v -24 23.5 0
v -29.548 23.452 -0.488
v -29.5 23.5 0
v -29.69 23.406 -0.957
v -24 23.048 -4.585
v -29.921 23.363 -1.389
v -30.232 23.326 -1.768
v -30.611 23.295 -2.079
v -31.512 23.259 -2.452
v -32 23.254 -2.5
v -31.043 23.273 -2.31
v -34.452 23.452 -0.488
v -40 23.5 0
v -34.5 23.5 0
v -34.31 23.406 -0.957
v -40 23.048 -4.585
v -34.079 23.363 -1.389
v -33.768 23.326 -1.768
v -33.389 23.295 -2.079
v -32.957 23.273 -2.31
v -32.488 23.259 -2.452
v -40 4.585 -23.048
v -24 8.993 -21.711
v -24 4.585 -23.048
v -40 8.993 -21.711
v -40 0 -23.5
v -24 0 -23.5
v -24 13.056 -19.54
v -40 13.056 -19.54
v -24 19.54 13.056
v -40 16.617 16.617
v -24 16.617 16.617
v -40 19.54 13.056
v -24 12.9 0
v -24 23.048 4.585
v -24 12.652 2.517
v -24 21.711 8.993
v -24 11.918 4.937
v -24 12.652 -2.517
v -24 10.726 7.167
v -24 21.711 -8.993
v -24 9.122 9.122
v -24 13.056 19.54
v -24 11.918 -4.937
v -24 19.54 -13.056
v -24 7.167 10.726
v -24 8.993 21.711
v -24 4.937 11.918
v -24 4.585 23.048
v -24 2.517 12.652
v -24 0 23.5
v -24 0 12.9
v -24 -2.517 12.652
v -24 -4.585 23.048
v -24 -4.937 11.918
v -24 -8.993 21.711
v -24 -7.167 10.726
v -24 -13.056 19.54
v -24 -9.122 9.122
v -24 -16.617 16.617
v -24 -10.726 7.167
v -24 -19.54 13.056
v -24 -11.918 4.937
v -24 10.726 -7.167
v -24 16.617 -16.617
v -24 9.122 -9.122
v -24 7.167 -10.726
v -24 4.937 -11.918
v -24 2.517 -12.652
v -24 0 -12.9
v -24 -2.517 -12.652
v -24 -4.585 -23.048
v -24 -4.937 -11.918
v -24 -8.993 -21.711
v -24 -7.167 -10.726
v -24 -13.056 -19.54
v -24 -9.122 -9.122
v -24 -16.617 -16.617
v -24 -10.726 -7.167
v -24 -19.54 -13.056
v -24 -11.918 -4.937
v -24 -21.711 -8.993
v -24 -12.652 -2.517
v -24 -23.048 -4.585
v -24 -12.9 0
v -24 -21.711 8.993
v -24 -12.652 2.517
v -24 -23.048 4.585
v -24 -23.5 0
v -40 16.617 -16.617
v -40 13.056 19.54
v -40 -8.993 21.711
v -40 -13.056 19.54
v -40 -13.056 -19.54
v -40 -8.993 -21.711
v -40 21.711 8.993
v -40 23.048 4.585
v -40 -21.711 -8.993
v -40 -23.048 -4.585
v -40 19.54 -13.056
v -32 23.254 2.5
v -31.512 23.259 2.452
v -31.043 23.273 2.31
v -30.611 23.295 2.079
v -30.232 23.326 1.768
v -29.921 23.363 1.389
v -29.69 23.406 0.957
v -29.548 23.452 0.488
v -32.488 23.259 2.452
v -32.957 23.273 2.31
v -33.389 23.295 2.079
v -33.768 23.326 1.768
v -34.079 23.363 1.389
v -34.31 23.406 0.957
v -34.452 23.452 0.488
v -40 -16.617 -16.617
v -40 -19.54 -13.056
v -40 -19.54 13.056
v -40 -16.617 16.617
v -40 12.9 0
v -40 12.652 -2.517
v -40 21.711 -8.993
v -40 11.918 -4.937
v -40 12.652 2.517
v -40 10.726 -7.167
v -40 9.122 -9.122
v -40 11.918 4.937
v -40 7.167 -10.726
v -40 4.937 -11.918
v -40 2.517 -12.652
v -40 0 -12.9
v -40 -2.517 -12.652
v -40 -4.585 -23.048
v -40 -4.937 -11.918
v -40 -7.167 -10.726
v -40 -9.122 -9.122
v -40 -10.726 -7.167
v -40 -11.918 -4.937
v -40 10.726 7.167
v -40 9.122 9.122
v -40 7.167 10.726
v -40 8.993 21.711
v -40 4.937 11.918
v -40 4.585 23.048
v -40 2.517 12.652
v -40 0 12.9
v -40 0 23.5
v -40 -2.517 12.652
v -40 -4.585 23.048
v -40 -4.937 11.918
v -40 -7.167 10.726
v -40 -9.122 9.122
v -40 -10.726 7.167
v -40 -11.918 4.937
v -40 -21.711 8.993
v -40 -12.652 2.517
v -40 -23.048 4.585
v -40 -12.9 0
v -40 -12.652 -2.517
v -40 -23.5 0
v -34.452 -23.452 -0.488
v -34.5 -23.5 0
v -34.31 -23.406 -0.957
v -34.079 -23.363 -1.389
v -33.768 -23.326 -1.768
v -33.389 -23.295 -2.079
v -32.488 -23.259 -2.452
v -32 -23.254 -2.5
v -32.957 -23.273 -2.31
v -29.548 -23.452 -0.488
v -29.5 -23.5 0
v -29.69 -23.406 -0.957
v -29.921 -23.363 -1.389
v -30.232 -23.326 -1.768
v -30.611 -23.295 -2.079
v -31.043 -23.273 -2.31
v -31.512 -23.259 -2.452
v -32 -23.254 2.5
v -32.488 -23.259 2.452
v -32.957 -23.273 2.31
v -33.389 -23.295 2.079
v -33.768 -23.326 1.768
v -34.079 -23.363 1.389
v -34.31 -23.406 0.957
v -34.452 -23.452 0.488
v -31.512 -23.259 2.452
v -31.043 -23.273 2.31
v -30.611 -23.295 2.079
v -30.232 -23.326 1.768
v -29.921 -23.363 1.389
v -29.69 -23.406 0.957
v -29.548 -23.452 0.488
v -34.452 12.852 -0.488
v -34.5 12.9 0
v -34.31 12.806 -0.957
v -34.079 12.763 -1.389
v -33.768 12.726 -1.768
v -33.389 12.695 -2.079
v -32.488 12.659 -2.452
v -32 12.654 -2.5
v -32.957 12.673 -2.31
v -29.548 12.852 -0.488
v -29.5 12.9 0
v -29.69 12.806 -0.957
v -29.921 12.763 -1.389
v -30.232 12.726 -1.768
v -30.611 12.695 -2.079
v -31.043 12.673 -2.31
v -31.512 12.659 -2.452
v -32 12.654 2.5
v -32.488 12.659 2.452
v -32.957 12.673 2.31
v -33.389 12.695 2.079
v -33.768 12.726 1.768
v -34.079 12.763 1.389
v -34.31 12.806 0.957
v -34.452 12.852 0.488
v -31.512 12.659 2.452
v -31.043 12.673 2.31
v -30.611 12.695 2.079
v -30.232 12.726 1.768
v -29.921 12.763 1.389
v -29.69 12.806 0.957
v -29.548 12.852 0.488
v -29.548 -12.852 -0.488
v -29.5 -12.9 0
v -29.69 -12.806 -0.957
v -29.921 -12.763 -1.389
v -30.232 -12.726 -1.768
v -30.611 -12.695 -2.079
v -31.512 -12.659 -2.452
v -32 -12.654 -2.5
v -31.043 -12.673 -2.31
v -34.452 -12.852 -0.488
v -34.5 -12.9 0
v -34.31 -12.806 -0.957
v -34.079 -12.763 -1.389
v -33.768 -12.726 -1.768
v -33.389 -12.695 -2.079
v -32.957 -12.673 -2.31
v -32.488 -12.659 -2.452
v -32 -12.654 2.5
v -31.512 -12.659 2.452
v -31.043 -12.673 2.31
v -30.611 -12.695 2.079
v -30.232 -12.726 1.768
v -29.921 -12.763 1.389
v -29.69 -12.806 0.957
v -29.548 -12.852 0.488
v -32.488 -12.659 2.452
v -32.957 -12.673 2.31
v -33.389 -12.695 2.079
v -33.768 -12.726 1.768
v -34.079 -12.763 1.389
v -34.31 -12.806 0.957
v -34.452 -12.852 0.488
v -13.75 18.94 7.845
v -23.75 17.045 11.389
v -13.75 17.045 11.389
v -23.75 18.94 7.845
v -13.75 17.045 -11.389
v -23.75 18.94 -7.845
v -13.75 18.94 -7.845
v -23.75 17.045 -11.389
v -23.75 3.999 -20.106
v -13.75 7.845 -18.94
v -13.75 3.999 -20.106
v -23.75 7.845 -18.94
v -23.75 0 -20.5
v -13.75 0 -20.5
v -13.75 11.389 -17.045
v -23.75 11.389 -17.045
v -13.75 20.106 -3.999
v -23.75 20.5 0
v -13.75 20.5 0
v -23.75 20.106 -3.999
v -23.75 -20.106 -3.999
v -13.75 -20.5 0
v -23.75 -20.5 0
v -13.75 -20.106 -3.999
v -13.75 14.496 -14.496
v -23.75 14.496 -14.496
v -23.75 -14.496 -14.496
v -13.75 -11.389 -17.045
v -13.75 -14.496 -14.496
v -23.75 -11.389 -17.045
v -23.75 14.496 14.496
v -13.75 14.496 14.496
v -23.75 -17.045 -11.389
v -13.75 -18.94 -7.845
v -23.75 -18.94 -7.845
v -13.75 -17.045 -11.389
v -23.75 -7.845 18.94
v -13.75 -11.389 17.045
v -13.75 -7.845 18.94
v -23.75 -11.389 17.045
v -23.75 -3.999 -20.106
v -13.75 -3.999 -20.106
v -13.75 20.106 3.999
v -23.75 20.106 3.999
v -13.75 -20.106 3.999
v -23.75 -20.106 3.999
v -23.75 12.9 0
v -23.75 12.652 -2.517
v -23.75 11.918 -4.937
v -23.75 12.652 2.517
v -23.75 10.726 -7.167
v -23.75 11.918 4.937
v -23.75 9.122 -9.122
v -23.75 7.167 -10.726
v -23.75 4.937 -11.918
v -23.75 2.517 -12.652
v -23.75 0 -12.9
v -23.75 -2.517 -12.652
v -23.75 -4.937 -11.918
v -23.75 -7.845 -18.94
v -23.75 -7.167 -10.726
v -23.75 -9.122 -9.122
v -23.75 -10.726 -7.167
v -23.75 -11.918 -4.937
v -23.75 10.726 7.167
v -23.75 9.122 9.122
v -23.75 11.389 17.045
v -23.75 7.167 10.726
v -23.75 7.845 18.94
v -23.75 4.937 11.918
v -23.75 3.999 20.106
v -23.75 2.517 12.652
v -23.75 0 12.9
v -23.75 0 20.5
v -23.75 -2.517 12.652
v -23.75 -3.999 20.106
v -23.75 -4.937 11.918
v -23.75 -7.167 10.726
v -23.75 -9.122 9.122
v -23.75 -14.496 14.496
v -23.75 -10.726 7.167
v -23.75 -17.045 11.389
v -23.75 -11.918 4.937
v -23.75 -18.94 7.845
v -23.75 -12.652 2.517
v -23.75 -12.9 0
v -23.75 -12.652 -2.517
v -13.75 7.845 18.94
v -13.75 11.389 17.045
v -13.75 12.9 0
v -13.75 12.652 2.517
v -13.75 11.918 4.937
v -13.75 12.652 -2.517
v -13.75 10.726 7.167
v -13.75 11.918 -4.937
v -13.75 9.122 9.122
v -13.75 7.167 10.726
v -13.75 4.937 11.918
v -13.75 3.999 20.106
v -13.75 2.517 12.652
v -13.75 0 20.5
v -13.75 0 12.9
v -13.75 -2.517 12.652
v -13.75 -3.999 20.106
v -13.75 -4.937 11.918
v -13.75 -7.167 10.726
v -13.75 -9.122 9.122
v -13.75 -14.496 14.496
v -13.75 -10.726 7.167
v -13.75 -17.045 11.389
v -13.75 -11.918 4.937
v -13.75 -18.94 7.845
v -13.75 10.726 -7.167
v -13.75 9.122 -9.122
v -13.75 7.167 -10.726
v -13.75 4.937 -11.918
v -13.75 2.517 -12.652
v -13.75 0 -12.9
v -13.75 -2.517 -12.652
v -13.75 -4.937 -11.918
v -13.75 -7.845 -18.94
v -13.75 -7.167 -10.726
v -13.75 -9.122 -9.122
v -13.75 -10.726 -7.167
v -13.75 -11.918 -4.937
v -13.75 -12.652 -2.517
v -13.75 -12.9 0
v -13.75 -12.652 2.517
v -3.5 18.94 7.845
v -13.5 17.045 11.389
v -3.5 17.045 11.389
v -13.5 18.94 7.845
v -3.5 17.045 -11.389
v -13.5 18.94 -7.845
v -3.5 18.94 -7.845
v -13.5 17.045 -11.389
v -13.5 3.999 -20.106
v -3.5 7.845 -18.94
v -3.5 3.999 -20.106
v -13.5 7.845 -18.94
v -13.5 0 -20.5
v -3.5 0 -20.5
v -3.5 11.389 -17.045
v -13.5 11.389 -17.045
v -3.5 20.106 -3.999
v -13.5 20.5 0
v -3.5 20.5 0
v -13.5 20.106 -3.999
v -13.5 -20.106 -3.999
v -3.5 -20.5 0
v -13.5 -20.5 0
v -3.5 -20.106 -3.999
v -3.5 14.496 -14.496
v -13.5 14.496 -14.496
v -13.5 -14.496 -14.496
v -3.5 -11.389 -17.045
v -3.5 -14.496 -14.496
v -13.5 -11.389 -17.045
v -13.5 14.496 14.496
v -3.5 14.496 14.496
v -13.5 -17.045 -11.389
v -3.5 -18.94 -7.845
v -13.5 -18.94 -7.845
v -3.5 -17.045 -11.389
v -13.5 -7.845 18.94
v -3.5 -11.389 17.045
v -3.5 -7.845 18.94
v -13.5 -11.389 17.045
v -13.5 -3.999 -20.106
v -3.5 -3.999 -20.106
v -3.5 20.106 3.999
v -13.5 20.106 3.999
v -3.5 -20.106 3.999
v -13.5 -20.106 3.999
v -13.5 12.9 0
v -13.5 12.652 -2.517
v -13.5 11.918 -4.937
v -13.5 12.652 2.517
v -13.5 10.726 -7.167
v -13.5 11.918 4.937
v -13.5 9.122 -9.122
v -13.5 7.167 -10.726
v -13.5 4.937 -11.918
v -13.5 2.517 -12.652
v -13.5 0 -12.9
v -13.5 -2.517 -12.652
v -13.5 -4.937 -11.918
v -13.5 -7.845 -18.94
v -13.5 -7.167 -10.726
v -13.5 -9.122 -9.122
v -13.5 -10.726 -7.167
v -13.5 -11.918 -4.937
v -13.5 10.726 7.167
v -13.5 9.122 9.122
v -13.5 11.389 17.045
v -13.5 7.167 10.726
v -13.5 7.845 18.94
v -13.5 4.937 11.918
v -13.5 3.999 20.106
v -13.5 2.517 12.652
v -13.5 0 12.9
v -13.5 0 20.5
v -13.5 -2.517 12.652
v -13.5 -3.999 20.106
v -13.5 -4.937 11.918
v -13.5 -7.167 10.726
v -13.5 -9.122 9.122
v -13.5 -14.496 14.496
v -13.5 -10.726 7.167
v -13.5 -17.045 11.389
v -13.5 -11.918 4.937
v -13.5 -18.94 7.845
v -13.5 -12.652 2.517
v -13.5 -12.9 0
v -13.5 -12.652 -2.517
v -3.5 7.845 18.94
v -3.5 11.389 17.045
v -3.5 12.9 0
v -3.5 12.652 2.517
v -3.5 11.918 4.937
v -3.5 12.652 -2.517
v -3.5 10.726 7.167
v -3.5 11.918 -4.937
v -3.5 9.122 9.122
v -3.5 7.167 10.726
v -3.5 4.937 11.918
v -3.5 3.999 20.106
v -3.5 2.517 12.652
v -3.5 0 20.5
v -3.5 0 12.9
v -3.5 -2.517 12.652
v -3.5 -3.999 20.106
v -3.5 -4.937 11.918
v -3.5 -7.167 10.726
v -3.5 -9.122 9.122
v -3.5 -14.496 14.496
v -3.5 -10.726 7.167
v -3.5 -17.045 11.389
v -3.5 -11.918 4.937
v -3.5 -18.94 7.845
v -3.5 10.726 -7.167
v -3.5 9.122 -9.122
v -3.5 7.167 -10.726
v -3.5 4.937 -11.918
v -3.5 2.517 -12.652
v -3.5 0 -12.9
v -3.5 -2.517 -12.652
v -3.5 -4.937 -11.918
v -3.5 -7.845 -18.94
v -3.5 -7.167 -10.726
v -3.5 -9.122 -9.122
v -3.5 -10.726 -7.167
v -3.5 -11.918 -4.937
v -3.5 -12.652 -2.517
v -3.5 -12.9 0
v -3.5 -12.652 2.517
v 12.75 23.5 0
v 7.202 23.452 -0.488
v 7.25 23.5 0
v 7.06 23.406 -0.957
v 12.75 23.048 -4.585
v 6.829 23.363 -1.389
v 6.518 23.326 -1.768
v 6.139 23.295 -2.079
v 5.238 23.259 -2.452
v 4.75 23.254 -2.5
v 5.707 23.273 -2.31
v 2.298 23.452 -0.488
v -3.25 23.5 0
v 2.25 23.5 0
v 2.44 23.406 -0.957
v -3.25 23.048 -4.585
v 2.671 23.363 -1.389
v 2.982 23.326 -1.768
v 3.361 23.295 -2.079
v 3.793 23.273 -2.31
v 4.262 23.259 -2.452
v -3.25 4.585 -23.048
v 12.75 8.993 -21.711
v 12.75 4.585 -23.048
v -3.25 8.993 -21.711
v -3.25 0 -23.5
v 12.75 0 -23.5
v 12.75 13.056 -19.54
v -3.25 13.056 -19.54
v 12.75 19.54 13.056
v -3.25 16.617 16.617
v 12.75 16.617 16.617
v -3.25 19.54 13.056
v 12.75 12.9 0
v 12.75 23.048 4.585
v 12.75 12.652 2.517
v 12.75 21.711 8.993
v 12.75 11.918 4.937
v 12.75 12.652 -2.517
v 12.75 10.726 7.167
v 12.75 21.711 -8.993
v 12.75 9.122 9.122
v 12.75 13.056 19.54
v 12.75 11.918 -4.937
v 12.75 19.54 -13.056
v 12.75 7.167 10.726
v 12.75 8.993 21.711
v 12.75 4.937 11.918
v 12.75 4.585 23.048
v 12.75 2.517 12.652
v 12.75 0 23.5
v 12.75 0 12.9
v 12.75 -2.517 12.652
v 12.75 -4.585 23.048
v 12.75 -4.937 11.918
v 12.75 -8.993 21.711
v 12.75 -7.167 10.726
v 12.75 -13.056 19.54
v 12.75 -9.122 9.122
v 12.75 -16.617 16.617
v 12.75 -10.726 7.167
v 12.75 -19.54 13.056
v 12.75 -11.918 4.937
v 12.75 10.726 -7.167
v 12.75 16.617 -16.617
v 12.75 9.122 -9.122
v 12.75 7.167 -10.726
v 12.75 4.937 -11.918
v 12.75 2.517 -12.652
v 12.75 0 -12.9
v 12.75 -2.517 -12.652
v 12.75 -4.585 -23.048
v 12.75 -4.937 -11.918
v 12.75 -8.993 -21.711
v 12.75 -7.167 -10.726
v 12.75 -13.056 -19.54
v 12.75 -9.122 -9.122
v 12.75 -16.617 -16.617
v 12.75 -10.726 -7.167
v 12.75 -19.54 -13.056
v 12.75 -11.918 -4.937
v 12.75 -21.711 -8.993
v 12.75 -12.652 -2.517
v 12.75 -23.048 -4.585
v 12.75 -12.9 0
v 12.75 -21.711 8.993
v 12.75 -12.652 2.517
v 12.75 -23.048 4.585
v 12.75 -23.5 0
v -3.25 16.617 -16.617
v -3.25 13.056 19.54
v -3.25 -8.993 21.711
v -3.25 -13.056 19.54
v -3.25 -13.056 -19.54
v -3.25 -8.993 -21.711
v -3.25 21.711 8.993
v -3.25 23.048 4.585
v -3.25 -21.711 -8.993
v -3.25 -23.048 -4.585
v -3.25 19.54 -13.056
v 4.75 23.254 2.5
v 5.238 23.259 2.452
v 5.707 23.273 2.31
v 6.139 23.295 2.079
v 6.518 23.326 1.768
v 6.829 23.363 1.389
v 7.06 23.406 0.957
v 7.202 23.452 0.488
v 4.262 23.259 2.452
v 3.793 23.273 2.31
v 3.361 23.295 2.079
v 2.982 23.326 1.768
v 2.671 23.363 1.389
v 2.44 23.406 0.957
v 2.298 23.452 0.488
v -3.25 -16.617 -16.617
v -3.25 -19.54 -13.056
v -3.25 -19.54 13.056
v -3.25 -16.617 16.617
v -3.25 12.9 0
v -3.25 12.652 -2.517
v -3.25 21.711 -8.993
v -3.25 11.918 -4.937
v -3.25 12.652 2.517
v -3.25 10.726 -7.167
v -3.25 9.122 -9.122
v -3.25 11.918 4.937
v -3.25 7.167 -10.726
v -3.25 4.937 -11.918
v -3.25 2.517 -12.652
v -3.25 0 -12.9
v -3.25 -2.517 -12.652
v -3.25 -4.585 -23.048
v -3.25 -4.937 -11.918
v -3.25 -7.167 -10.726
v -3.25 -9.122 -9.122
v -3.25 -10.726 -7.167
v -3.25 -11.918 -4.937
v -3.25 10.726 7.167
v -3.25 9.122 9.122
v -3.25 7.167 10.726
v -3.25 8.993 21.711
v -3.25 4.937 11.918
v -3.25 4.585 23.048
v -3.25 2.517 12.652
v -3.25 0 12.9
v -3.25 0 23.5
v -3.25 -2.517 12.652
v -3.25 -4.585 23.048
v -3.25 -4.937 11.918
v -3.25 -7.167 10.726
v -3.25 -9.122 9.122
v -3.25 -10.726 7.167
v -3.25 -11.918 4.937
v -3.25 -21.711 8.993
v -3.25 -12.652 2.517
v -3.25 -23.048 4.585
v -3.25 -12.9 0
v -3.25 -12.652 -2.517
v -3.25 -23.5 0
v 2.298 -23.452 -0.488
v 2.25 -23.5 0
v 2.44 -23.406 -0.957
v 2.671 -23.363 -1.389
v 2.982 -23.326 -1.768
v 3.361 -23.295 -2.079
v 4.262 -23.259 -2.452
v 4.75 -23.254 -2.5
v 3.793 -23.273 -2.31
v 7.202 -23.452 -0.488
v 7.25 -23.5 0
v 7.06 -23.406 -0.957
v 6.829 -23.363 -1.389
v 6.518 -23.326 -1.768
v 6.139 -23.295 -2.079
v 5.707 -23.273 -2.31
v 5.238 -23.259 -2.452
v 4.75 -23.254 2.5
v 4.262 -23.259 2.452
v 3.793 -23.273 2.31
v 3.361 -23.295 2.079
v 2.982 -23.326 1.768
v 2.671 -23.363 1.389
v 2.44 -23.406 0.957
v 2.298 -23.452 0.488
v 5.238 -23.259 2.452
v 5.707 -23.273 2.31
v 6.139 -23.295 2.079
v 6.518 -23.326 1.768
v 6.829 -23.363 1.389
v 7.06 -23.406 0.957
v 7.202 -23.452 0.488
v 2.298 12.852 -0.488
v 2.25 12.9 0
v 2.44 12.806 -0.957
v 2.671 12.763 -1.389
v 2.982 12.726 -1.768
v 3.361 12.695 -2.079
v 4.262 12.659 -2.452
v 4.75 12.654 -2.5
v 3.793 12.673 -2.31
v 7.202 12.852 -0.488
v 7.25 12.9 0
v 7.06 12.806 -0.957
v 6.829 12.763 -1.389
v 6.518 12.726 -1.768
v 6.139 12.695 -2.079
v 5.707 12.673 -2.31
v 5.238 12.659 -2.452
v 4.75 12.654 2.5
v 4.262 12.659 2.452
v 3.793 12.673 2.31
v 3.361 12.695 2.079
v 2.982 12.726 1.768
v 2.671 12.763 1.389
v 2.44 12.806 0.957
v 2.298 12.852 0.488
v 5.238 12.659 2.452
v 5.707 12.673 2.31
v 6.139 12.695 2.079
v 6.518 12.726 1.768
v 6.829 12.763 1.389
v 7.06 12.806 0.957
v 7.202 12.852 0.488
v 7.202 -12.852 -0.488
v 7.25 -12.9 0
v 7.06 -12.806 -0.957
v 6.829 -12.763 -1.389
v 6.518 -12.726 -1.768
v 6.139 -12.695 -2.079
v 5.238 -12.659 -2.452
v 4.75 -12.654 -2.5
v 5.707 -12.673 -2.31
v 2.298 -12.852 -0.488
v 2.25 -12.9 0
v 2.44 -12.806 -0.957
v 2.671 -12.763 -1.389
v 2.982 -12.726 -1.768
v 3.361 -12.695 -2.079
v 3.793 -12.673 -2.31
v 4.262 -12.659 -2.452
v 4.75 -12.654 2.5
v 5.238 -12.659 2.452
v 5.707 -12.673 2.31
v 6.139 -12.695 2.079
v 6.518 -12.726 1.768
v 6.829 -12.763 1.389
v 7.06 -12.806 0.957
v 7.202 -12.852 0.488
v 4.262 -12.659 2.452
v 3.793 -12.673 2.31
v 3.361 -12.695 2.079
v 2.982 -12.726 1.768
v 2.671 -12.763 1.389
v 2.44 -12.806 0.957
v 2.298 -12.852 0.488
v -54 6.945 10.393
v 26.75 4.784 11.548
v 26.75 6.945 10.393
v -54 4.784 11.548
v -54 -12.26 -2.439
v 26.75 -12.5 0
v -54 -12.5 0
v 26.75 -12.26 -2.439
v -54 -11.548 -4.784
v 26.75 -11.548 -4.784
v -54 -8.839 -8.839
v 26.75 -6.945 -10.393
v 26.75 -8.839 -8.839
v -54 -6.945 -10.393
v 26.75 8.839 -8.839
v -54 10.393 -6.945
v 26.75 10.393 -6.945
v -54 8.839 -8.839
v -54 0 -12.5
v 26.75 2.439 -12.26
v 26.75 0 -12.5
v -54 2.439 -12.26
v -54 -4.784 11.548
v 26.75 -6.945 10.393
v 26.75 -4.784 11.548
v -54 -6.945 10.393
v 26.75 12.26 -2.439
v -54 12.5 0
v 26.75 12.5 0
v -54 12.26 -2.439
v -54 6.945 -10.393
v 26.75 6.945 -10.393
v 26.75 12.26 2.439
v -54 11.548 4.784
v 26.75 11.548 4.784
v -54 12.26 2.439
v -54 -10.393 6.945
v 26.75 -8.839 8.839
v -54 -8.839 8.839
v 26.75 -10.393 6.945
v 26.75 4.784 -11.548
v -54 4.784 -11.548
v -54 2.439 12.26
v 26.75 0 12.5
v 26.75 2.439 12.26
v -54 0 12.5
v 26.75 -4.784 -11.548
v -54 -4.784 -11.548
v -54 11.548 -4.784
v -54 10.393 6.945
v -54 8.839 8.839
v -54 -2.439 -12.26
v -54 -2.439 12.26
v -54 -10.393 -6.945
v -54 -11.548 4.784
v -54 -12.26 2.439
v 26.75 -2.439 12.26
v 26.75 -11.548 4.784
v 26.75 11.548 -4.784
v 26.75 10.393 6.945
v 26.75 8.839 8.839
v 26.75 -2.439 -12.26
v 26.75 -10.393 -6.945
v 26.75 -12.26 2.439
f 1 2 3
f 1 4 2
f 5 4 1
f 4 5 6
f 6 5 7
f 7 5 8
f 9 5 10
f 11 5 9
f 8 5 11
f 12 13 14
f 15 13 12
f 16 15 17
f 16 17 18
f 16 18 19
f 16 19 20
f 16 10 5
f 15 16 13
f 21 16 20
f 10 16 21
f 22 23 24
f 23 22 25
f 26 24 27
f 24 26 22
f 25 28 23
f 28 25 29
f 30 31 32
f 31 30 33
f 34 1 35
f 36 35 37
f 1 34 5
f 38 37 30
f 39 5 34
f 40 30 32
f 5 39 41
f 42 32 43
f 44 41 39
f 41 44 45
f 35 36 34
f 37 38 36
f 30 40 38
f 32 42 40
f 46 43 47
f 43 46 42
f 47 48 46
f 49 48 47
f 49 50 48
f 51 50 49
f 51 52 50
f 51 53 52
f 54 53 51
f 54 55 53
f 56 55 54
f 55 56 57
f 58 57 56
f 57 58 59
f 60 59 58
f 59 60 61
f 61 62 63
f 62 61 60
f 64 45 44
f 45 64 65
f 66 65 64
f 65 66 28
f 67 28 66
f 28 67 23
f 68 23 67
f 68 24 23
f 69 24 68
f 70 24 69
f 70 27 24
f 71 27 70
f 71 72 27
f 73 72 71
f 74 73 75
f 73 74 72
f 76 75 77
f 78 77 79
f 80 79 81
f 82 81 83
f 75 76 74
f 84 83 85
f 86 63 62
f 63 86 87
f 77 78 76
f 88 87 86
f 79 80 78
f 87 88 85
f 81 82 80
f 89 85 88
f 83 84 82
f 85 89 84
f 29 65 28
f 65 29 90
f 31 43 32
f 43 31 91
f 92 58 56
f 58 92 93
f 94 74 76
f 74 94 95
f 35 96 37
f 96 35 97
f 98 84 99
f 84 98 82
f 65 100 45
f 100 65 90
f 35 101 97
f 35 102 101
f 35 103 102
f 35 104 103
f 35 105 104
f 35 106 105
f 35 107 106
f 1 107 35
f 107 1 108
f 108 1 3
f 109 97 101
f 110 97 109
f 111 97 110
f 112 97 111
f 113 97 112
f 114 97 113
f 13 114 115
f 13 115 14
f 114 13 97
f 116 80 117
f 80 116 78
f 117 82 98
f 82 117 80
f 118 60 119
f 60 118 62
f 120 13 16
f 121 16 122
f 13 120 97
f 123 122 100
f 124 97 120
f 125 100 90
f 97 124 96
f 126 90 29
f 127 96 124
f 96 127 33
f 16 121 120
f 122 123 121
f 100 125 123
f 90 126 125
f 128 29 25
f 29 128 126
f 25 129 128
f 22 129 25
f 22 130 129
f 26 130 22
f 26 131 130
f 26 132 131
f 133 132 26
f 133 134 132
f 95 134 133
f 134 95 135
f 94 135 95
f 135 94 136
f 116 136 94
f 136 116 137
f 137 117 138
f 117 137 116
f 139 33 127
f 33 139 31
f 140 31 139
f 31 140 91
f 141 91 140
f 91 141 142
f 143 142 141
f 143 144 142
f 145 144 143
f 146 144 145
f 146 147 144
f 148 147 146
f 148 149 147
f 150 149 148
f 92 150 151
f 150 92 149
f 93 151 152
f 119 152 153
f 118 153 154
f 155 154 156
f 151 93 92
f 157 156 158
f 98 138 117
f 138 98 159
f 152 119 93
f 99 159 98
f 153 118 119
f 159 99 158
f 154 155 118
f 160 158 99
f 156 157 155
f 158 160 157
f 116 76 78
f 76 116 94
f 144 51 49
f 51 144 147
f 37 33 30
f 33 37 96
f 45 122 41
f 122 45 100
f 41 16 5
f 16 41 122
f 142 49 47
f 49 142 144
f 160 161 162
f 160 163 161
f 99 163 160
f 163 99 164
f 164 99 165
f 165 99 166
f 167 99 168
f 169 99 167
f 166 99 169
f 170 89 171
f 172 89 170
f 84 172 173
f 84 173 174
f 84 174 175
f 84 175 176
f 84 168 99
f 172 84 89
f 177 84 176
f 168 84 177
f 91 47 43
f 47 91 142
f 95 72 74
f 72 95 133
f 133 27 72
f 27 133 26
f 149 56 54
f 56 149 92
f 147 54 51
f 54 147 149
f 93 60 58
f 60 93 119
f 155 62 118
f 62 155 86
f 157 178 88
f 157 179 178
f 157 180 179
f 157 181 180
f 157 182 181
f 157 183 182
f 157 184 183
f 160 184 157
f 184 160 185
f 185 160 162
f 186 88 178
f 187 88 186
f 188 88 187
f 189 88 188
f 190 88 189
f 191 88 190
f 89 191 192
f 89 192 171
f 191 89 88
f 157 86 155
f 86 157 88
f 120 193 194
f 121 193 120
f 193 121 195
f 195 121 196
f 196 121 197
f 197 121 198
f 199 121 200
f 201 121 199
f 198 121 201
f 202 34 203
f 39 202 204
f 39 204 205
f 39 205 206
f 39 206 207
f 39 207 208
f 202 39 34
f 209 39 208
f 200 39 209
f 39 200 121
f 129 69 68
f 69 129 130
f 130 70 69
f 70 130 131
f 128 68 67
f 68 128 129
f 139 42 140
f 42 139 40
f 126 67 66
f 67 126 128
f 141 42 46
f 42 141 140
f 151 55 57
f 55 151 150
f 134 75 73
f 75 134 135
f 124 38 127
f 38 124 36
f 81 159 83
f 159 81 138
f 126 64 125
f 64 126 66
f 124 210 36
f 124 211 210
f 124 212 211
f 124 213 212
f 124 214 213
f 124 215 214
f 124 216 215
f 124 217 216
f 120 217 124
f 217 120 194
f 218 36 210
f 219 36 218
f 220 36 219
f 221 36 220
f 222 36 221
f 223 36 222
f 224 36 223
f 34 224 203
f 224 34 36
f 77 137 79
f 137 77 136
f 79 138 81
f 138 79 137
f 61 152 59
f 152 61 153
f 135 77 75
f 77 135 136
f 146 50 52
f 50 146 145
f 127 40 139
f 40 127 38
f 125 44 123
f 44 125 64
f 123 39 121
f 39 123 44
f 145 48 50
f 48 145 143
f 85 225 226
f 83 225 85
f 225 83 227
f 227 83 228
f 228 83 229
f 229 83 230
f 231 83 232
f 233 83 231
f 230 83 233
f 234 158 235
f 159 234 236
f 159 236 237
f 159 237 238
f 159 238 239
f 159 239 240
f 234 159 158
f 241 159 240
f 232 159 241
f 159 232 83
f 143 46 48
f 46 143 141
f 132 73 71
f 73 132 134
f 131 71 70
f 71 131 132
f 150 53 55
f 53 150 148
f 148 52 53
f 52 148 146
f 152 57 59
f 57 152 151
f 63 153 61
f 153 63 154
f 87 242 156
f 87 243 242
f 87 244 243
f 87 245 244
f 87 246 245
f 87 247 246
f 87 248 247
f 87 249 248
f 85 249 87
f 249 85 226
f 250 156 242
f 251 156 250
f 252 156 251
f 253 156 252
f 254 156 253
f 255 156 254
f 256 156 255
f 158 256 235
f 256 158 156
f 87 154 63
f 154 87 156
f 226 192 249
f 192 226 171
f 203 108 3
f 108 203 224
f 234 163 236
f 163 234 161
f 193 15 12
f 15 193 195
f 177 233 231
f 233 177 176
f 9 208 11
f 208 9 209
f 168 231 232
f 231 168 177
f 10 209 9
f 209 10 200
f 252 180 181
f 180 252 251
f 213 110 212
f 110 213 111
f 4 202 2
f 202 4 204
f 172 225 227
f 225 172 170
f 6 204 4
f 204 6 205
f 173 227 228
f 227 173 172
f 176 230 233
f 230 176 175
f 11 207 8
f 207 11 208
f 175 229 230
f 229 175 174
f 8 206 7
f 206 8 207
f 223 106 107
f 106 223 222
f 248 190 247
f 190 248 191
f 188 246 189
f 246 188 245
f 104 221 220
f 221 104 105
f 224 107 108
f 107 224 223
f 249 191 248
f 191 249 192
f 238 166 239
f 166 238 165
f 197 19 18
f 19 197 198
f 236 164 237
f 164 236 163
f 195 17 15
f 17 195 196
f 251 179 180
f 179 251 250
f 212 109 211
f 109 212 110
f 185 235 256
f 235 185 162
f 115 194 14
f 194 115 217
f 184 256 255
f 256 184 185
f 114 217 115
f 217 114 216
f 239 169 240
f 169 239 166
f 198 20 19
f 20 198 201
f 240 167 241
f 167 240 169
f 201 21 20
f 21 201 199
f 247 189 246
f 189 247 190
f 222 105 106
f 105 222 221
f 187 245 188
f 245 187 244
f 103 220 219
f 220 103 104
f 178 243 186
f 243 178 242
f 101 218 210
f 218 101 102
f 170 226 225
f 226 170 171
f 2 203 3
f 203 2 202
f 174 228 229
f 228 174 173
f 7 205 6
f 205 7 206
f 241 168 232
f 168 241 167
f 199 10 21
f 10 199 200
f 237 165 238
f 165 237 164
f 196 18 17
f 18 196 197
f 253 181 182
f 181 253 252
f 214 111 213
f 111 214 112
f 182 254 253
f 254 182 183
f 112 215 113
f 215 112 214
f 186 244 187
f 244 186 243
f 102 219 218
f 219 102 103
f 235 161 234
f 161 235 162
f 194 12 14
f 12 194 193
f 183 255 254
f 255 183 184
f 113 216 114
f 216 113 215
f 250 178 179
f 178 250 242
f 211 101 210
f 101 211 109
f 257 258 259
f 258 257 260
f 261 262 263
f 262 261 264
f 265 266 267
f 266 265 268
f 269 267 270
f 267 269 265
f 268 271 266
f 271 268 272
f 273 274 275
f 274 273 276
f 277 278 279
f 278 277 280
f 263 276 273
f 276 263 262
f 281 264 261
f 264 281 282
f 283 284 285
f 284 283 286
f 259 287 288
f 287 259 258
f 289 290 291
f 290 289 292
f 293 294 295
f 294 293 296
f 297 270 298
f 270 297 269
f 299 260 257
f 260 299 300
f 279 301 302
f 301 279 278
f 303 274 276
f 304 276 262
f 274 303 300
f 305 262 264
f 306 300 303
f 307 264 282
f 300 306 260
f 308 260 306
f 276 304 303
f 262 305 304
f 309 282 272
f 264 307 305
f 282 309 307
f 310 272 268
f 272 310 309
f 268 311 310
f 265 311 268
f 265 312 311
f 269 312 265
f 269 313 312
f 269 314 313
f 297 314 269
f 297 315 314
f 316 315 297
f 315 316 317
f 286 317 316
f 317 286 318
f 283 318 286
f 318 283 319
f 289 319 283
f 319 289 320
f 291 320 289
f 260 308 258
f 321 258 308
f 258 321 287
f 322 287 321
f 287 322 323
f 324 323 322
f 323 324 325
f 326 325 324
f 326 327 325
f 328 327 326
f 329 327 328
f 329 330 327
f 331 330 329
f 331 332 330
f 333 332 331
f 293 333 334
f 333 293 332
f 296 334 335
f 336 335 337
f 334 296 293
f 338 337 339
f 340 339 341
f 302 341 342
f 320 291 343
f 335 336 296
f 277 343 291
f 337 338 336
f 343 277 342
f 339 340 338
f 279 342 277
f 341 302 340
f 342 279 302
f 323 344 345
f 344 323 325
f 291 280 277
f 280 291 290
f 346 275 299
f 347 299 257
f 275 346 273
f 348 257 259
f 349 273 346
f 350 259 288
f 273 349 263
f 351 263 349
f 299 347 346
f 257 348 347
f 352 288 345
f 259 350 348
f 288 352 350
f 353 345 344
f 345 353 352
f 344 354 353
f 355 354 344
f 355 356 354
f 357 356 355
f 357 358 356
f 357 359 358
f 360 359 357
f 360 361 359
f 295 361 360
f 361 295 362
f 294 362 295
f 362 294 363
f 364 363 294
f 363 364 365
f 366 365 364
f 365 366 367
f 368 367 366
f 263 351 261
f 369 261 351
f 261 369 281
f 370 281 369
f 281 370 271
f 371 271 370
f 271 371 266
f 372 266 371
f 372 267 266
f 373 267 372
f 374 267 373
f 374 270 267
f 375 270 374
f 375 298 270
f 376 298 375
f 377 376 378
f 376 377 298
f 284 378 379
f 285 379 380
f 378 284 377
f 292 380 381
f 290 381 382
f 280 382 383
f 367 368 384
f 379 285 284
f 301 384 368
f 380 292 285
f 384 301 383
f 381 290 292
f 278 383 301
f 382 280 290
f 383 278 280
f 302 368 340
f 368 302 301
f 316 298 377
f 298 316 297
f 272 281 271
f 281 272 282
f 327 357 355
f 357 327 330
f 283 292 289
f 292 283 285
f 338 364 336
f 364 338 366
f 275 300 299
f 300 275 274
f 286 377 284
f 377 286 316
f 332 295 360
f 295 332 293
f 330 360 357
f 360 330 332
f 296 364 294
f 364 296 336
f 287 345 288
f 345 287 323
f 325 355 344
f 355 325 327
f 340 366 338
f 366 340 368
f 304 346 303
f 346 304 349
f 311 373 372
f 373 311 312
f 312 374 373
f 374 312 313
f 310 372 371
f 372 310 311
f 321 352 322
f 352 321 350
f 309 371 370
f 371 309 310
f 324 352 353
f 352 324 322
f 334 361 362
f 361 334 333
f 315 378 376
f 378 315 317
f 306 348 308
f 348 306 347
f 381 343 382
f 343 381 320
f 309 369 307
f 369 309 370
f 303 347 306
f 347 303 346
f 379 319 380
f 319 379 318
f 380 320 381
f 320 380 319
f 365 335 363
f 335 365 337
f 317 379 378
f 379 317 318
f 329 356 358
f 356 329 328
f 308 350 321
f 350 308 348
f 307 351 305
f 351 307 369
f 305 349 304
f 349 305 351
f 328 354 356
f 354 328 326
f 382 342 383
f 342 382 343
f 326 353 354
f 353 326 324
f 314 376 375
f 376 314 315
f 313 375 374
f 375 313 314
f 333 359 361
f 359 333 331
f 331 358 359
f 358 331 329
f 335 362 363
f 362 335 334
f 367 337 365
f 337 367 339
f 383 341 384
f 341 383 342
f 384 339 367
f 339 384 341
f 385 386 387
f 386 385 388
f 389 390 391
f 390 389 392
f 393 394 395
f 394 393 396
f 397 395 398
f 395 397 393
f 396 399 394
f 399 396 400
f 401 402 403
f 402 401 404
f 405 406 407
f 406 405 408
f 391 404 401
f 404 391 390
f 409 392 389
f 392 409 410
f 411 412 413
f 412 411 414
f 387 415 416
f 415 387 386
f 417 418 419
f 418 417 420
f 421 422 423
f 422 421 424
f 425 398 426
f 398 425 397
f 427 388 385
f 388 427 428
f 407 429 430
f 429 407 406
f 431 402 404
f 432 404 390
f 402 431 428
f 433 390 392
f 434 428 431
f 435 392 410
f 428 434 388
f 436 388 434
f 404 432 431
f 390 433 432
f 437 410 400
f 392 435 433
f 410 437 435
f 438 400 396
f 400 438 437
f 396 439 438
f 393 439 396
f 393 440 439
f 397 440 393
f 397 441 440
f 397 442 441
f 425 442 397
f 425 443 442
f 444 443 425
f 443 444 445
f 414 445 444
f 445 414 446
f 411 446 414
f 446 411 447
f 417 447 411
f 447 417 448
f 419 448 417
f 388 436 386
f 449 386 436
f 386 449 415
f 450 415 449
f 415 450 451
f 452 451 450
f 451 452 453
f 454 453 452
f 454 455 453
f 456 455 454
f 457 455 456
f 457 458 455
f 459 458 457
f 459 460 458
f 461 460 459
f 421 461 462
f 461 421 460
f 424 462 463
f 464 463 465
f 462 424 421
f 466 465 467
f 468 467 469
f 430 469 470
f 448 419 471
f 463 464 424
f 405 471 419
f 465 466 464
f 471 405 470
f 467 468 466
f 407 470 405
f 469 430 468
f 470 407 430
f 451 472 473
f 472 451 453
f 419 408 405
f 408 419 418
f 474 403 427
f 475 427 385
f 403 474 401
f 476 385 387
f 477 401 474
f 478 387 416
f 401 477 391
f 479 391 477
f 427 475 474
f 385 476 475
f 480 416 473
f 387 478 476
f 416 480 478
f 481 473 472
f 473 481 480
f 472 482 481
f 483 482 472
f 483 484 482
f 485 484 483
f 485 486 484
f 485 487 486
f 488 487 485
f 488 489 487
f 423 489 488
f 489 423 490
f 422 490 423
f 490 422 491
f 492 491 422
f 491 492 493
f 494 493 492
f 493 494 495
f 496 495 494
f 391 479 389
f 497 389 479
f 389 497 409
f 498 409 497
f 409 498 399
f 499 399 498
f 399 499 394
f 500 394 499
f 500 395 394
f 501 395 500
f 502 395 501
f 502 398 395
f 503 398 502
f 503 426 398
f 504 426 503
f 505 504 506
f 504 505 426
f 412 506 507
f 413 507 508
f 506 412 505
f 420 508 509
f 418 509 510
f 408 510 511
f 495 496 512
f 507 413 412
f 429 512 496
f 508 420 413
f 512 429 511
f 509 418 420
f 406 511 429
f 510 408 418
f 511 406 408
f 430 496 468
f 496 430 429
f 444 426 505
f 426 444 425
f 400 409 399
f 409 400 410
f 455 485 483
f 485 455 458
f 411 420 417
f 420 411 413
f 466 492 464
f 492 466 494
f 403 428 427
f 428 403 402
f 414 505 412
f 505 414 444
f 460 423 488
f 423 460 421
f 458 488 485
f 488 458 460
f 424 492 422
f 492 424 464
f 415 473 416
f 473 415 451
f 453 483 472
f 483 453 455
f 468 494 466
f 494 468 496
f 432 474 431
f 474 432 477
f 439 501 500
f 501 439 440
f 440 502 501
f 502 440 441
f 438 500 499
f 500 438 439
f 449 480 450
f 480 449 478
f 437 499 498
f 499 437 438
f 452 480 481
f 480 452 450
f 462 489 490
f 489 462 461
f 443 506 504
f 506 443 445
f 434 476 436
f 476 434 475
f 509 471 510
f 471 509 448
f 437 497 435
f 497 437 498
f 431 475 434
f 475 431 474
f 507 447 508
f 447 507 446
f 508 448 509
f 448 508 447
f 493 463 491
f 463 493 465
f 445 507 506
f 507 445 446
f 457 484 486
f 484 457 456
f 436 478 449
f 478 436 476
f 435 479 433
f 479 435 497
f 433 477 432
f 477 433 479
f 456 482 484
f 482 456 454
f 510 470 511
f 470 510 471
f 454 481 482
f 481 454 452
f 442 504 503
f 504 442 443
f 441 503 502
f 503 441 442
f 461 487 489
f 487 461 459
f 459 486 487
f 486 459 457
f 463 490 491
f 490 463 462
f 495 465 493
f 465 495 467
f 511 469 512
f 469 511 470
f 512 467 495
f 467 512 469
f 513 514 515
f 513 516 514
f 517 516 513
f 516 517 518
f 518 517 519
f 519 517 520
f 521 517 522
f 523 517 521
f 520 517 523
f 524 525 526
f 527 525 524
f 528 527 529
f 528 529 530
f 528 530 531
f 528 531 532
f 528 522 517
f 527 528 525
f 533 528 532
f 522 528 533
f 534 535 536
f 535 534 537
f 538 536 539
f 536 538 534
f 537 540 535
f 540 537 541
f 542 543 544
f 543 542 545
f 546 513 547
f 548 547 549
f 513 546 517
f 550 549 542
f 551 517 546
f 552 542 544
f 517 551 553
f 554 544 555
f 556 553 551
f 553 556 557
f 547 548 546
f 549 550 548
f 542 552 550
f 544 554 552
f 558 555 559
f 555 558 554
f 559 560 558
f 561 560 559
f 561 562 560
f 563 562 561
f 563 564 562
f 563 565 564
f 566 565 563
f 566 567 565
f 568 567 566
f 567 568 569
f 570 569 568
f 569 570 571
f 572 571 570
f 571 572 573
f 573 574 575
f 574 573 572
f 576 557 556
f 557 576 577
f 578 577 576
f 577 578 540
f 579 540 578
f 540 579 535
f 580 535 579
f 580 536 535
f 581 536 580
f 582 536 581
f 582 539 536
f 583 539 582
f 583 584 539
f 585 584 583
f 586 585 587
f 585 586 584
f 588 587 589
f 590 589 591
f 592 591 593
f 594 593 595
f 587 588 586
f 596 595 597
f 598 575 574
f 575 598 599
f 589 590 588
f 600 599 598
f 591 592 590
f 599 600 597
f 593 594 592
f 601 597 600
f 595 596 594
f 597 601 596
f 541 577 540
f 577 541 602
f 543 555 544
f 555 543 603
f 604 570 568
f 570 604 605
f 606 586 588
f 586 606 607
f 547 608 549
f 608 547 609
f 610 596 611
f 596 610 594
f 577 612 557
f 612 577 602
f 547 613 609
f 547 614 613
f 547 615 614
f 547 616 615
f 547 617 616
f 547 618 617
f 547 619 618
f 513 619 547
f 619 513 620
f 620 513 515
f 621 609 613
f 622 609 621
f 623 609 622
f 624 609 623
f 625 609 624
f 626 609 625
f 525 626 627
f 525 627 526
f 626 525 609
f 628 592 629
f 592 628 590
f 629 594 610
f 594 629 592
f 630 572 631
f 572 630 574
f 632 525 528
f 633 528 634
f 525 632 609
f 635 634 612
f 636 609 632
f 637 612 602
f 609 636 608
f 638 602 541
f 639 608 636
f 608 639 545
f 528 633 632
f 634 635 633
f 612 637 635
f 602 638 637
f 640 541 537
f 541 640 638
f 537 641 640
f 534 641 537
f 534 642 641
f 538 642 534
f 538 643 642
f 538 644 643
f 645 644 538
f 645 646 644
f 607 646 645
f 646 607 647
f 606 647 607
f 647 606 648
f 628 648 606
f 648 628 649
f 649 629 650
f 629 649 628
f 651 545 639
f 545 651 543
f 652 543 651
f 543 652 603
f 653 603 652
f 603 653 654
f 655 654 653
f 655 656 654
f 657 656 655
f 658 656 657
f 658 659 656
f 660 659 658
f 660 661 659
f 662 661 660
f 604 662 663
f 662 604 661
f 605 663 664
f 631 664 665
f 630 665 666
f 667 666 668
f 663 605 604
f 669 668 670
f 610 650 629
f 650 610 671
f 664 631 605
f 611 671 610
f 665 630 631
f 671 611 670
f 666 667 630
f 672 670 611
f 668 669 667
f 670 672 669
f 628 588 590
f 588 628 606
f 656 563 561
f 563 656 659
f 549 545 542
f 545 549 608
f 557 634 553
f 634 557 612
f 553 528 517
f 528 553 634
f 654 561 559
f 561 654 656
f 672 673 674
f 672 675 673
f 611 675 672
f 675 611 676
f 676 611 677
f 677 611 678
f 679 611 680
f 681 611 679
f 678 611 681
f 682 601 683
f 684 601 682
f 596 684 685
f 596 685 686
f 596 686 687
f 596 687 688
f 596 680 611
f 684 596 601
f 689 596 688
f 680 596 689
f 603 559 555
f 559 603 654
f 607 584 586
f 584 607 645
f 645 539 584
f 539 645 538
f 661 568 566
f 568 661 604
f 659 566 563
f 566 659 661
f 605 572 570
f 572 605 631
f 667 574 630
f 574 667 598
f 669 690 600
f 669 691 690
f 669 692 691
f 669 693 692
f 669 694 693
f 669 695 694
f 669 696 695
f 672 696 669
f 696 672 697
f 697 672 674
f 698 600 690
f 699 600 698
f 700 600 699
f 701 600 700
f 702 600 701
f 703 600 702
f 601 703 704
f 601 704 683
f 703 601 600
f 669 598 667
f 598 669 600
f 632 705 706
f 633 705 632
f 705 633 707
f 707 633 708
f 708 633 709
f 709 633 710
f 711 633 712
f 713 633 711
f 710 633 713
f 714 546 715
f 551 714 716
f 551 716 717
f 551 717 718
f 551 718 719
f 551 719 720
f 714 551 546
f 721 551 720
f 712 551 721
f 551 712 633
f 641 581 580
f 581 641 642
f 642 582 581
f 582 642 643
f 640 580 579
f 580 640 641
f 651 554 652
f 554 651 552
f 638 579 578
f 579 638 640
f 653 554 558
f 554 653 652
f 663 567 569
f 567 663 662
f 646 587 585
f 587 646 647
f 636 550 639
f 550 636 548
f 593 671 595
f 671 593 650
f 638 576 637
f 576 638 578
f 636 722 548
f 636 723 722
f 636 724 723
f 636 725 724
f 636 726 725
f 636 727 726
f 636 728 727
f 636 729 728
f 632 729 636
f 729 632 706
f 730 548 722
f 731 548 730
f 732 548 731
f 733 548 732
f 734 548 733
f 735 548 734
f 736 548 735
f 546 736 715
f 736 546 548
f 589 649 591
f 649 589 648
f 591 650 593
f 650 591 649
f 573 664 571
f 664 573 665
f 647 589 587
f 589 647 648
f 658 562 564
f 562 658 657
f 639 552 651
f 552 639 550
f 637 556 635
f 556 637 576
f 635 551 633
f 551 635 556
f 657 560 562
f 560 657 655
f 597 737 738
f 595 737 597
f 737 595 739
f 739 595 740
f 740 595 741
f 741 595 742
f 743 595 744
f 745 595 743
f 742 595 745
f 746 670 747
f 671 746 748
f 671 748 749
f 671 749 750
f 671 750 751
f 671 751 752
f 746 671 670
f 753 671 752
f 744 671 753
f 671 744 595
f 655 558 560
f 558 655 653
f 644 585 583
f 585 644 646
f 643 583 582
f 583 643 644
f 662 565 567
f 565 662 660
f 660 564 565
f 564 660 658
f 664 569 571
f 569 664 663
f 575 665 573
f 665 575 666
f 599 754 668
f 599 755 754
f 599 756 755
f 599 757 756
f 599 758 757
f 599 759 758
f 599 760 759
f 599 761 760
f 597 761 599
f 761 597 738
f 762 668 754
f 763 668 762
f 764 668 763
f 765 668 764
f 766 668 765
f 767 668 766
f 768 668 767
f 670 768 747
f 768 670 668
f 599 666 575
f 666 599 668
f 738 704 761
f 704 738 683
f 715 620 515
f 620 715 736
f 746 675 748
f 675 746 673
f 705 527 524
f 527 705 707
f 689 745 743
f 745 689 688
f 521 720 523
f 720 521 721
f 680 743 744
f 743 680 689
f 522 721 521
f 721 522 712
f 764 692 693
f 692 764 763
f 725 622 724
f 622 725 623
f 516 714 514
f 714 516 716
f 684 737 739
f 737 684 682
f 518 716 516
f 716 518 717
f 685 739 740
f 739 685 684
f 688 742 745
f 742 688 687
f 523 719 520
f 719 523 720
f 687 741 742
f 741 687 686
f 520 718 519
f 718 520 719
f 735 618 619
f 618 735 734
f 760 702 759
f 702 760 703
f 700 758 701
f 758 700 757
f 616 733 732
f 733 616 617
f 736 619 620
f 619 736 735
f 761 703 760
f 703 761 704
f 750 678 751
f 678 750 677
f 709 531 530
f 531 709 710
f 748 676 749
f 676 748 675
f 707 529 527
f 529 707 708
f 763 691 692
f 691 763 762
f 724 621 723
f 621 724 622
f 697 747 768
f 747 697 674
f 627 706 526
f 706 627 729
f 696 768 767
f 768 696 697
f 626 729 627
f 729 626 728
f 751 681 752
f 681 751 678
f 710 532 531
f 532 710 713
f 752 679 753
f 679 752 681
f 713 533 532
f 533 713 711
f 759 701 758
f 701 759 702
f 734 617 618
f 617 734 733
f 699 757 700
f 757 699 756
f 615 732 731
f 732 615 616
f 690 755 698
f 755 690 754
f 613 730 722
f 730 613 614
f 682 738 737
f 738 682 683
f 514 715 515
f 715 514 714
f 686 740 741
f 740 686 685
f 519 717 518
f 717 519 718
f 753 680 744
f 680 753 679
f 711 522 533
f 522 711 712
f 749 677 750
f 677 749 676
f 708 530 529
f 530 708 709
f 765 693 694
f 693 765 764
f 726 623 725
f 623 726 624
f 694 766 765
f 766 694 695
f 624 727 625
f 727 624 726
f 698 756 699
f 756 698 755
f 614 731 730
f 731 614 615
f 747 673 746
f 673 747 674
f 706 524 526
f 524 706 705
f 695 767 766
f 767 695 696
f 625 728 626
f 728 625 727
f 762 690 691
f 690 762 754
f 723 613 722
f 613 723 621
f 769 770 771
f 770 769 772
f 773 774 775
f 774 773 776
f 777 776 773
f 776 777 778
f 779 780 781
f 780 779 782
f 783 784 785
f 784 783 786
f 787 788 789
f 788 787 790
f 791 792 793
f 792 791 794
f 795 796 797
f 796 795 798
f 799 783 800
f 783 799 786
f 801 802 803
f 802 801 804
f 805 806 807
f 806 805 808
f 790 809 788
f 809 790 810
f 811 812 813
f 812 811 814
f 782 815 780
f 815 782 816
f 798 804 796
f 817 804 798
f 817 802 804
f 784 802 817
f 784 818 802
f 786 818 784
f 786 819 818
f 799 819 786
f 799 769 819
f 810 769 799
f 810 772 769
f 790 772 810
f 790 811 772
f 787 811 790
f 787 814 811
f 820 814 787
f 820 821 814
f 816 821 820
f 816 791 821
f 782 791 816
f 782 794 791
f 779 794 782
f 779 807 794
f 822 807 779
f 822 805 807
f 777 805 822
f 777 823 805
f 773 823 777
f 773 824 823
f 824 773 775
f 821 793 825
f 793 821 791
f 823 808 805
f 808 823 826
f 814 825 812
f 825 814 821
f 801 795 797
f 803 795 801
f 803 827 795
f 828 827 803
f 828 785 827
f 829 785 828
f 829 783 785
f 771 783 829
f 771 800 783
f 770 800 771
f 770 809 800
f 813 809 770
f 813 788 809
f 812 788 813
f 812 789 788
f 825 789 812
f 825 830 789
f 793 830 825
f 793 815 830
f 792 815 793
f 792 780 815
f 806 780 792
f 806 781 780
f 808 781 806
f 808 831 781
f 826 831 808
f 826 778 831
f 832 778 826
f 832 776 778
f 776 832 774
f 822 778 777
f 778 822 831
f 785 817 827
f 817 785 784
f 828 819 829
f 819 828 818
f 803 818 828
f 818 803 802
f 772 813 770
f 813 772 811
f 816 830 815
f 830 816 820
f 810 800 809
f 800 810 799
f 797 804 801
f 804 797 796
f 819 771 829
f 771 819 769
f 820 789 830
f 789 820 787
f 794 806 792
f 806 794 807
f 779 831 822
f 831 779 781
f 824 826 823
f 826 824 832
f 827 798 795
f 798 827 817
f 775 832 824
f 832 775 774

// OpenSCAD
$fn = 32;

// ------------------------------------------------------------------------
// Shaft with rings and collars: d25 shaft, 4 rings
// Every part is its own module, assembly() places them once.
// ------------------------------------------------------------------------

// --- part 1 ---
module shaft() {
  translate([0, 0, -40.375]) cylinder(h = 80.75, d = 25);
}

// --- part 2 ---
module collar_a() {
  difference() {
    cylinder(h = 16, d = 47);
    translate([0, 0, -1]) cylinder(h = 18, d = 25.8);
    translate([0, 0, 8]) rotate([90, 0, 0]) cylinder(h = 49, d = 5, center = true);
  }
}

// --- part 3 ---
module spacer_a() {
  difference() {
      translate([0, 0, 0]) cylinder(h = 10, d = 41);
      translate([0, 0, -1]) cylinder(h = 12, d = 25.8);
    }
}

// --- part 4 ---
module spacer_b() {
  difference() {
      translate([0, 0, 0]) cylinder(h = 10, d = 41);
      translate([0, 0, -1]) cylinder(h = 12, d = 25.8);
    }
}

// --- part 5 ---
module collar_b() {
  difference() {
    cylinder(h = 16, d = 47);
    translate([0, 0, -1]) cylinder(h = 18, d = 25.8);
    translate([0, 0, 8]) rotate([90, 0, 0]) cylinder(h = 49, d = 5, center = true);
  }
}

// --- assembly ---
module assembly() {
  translate([-13.625, 0, 0]) rotate([0, 90, 0]) shaft();
  translate([-40, 0, 0]) rotate([0, 90, 0]) collar_a();
  translate([-23.75, 0, 0]) rotate([0, 90, 0]) spacer_a();
  translate([-13.5, 0, 0]) rotate([0, 90, 0]) spacer_b();
  translate([-3.25, 0, 0]) rotate([0, 90, 0]) collar_b();
}

assembly();
